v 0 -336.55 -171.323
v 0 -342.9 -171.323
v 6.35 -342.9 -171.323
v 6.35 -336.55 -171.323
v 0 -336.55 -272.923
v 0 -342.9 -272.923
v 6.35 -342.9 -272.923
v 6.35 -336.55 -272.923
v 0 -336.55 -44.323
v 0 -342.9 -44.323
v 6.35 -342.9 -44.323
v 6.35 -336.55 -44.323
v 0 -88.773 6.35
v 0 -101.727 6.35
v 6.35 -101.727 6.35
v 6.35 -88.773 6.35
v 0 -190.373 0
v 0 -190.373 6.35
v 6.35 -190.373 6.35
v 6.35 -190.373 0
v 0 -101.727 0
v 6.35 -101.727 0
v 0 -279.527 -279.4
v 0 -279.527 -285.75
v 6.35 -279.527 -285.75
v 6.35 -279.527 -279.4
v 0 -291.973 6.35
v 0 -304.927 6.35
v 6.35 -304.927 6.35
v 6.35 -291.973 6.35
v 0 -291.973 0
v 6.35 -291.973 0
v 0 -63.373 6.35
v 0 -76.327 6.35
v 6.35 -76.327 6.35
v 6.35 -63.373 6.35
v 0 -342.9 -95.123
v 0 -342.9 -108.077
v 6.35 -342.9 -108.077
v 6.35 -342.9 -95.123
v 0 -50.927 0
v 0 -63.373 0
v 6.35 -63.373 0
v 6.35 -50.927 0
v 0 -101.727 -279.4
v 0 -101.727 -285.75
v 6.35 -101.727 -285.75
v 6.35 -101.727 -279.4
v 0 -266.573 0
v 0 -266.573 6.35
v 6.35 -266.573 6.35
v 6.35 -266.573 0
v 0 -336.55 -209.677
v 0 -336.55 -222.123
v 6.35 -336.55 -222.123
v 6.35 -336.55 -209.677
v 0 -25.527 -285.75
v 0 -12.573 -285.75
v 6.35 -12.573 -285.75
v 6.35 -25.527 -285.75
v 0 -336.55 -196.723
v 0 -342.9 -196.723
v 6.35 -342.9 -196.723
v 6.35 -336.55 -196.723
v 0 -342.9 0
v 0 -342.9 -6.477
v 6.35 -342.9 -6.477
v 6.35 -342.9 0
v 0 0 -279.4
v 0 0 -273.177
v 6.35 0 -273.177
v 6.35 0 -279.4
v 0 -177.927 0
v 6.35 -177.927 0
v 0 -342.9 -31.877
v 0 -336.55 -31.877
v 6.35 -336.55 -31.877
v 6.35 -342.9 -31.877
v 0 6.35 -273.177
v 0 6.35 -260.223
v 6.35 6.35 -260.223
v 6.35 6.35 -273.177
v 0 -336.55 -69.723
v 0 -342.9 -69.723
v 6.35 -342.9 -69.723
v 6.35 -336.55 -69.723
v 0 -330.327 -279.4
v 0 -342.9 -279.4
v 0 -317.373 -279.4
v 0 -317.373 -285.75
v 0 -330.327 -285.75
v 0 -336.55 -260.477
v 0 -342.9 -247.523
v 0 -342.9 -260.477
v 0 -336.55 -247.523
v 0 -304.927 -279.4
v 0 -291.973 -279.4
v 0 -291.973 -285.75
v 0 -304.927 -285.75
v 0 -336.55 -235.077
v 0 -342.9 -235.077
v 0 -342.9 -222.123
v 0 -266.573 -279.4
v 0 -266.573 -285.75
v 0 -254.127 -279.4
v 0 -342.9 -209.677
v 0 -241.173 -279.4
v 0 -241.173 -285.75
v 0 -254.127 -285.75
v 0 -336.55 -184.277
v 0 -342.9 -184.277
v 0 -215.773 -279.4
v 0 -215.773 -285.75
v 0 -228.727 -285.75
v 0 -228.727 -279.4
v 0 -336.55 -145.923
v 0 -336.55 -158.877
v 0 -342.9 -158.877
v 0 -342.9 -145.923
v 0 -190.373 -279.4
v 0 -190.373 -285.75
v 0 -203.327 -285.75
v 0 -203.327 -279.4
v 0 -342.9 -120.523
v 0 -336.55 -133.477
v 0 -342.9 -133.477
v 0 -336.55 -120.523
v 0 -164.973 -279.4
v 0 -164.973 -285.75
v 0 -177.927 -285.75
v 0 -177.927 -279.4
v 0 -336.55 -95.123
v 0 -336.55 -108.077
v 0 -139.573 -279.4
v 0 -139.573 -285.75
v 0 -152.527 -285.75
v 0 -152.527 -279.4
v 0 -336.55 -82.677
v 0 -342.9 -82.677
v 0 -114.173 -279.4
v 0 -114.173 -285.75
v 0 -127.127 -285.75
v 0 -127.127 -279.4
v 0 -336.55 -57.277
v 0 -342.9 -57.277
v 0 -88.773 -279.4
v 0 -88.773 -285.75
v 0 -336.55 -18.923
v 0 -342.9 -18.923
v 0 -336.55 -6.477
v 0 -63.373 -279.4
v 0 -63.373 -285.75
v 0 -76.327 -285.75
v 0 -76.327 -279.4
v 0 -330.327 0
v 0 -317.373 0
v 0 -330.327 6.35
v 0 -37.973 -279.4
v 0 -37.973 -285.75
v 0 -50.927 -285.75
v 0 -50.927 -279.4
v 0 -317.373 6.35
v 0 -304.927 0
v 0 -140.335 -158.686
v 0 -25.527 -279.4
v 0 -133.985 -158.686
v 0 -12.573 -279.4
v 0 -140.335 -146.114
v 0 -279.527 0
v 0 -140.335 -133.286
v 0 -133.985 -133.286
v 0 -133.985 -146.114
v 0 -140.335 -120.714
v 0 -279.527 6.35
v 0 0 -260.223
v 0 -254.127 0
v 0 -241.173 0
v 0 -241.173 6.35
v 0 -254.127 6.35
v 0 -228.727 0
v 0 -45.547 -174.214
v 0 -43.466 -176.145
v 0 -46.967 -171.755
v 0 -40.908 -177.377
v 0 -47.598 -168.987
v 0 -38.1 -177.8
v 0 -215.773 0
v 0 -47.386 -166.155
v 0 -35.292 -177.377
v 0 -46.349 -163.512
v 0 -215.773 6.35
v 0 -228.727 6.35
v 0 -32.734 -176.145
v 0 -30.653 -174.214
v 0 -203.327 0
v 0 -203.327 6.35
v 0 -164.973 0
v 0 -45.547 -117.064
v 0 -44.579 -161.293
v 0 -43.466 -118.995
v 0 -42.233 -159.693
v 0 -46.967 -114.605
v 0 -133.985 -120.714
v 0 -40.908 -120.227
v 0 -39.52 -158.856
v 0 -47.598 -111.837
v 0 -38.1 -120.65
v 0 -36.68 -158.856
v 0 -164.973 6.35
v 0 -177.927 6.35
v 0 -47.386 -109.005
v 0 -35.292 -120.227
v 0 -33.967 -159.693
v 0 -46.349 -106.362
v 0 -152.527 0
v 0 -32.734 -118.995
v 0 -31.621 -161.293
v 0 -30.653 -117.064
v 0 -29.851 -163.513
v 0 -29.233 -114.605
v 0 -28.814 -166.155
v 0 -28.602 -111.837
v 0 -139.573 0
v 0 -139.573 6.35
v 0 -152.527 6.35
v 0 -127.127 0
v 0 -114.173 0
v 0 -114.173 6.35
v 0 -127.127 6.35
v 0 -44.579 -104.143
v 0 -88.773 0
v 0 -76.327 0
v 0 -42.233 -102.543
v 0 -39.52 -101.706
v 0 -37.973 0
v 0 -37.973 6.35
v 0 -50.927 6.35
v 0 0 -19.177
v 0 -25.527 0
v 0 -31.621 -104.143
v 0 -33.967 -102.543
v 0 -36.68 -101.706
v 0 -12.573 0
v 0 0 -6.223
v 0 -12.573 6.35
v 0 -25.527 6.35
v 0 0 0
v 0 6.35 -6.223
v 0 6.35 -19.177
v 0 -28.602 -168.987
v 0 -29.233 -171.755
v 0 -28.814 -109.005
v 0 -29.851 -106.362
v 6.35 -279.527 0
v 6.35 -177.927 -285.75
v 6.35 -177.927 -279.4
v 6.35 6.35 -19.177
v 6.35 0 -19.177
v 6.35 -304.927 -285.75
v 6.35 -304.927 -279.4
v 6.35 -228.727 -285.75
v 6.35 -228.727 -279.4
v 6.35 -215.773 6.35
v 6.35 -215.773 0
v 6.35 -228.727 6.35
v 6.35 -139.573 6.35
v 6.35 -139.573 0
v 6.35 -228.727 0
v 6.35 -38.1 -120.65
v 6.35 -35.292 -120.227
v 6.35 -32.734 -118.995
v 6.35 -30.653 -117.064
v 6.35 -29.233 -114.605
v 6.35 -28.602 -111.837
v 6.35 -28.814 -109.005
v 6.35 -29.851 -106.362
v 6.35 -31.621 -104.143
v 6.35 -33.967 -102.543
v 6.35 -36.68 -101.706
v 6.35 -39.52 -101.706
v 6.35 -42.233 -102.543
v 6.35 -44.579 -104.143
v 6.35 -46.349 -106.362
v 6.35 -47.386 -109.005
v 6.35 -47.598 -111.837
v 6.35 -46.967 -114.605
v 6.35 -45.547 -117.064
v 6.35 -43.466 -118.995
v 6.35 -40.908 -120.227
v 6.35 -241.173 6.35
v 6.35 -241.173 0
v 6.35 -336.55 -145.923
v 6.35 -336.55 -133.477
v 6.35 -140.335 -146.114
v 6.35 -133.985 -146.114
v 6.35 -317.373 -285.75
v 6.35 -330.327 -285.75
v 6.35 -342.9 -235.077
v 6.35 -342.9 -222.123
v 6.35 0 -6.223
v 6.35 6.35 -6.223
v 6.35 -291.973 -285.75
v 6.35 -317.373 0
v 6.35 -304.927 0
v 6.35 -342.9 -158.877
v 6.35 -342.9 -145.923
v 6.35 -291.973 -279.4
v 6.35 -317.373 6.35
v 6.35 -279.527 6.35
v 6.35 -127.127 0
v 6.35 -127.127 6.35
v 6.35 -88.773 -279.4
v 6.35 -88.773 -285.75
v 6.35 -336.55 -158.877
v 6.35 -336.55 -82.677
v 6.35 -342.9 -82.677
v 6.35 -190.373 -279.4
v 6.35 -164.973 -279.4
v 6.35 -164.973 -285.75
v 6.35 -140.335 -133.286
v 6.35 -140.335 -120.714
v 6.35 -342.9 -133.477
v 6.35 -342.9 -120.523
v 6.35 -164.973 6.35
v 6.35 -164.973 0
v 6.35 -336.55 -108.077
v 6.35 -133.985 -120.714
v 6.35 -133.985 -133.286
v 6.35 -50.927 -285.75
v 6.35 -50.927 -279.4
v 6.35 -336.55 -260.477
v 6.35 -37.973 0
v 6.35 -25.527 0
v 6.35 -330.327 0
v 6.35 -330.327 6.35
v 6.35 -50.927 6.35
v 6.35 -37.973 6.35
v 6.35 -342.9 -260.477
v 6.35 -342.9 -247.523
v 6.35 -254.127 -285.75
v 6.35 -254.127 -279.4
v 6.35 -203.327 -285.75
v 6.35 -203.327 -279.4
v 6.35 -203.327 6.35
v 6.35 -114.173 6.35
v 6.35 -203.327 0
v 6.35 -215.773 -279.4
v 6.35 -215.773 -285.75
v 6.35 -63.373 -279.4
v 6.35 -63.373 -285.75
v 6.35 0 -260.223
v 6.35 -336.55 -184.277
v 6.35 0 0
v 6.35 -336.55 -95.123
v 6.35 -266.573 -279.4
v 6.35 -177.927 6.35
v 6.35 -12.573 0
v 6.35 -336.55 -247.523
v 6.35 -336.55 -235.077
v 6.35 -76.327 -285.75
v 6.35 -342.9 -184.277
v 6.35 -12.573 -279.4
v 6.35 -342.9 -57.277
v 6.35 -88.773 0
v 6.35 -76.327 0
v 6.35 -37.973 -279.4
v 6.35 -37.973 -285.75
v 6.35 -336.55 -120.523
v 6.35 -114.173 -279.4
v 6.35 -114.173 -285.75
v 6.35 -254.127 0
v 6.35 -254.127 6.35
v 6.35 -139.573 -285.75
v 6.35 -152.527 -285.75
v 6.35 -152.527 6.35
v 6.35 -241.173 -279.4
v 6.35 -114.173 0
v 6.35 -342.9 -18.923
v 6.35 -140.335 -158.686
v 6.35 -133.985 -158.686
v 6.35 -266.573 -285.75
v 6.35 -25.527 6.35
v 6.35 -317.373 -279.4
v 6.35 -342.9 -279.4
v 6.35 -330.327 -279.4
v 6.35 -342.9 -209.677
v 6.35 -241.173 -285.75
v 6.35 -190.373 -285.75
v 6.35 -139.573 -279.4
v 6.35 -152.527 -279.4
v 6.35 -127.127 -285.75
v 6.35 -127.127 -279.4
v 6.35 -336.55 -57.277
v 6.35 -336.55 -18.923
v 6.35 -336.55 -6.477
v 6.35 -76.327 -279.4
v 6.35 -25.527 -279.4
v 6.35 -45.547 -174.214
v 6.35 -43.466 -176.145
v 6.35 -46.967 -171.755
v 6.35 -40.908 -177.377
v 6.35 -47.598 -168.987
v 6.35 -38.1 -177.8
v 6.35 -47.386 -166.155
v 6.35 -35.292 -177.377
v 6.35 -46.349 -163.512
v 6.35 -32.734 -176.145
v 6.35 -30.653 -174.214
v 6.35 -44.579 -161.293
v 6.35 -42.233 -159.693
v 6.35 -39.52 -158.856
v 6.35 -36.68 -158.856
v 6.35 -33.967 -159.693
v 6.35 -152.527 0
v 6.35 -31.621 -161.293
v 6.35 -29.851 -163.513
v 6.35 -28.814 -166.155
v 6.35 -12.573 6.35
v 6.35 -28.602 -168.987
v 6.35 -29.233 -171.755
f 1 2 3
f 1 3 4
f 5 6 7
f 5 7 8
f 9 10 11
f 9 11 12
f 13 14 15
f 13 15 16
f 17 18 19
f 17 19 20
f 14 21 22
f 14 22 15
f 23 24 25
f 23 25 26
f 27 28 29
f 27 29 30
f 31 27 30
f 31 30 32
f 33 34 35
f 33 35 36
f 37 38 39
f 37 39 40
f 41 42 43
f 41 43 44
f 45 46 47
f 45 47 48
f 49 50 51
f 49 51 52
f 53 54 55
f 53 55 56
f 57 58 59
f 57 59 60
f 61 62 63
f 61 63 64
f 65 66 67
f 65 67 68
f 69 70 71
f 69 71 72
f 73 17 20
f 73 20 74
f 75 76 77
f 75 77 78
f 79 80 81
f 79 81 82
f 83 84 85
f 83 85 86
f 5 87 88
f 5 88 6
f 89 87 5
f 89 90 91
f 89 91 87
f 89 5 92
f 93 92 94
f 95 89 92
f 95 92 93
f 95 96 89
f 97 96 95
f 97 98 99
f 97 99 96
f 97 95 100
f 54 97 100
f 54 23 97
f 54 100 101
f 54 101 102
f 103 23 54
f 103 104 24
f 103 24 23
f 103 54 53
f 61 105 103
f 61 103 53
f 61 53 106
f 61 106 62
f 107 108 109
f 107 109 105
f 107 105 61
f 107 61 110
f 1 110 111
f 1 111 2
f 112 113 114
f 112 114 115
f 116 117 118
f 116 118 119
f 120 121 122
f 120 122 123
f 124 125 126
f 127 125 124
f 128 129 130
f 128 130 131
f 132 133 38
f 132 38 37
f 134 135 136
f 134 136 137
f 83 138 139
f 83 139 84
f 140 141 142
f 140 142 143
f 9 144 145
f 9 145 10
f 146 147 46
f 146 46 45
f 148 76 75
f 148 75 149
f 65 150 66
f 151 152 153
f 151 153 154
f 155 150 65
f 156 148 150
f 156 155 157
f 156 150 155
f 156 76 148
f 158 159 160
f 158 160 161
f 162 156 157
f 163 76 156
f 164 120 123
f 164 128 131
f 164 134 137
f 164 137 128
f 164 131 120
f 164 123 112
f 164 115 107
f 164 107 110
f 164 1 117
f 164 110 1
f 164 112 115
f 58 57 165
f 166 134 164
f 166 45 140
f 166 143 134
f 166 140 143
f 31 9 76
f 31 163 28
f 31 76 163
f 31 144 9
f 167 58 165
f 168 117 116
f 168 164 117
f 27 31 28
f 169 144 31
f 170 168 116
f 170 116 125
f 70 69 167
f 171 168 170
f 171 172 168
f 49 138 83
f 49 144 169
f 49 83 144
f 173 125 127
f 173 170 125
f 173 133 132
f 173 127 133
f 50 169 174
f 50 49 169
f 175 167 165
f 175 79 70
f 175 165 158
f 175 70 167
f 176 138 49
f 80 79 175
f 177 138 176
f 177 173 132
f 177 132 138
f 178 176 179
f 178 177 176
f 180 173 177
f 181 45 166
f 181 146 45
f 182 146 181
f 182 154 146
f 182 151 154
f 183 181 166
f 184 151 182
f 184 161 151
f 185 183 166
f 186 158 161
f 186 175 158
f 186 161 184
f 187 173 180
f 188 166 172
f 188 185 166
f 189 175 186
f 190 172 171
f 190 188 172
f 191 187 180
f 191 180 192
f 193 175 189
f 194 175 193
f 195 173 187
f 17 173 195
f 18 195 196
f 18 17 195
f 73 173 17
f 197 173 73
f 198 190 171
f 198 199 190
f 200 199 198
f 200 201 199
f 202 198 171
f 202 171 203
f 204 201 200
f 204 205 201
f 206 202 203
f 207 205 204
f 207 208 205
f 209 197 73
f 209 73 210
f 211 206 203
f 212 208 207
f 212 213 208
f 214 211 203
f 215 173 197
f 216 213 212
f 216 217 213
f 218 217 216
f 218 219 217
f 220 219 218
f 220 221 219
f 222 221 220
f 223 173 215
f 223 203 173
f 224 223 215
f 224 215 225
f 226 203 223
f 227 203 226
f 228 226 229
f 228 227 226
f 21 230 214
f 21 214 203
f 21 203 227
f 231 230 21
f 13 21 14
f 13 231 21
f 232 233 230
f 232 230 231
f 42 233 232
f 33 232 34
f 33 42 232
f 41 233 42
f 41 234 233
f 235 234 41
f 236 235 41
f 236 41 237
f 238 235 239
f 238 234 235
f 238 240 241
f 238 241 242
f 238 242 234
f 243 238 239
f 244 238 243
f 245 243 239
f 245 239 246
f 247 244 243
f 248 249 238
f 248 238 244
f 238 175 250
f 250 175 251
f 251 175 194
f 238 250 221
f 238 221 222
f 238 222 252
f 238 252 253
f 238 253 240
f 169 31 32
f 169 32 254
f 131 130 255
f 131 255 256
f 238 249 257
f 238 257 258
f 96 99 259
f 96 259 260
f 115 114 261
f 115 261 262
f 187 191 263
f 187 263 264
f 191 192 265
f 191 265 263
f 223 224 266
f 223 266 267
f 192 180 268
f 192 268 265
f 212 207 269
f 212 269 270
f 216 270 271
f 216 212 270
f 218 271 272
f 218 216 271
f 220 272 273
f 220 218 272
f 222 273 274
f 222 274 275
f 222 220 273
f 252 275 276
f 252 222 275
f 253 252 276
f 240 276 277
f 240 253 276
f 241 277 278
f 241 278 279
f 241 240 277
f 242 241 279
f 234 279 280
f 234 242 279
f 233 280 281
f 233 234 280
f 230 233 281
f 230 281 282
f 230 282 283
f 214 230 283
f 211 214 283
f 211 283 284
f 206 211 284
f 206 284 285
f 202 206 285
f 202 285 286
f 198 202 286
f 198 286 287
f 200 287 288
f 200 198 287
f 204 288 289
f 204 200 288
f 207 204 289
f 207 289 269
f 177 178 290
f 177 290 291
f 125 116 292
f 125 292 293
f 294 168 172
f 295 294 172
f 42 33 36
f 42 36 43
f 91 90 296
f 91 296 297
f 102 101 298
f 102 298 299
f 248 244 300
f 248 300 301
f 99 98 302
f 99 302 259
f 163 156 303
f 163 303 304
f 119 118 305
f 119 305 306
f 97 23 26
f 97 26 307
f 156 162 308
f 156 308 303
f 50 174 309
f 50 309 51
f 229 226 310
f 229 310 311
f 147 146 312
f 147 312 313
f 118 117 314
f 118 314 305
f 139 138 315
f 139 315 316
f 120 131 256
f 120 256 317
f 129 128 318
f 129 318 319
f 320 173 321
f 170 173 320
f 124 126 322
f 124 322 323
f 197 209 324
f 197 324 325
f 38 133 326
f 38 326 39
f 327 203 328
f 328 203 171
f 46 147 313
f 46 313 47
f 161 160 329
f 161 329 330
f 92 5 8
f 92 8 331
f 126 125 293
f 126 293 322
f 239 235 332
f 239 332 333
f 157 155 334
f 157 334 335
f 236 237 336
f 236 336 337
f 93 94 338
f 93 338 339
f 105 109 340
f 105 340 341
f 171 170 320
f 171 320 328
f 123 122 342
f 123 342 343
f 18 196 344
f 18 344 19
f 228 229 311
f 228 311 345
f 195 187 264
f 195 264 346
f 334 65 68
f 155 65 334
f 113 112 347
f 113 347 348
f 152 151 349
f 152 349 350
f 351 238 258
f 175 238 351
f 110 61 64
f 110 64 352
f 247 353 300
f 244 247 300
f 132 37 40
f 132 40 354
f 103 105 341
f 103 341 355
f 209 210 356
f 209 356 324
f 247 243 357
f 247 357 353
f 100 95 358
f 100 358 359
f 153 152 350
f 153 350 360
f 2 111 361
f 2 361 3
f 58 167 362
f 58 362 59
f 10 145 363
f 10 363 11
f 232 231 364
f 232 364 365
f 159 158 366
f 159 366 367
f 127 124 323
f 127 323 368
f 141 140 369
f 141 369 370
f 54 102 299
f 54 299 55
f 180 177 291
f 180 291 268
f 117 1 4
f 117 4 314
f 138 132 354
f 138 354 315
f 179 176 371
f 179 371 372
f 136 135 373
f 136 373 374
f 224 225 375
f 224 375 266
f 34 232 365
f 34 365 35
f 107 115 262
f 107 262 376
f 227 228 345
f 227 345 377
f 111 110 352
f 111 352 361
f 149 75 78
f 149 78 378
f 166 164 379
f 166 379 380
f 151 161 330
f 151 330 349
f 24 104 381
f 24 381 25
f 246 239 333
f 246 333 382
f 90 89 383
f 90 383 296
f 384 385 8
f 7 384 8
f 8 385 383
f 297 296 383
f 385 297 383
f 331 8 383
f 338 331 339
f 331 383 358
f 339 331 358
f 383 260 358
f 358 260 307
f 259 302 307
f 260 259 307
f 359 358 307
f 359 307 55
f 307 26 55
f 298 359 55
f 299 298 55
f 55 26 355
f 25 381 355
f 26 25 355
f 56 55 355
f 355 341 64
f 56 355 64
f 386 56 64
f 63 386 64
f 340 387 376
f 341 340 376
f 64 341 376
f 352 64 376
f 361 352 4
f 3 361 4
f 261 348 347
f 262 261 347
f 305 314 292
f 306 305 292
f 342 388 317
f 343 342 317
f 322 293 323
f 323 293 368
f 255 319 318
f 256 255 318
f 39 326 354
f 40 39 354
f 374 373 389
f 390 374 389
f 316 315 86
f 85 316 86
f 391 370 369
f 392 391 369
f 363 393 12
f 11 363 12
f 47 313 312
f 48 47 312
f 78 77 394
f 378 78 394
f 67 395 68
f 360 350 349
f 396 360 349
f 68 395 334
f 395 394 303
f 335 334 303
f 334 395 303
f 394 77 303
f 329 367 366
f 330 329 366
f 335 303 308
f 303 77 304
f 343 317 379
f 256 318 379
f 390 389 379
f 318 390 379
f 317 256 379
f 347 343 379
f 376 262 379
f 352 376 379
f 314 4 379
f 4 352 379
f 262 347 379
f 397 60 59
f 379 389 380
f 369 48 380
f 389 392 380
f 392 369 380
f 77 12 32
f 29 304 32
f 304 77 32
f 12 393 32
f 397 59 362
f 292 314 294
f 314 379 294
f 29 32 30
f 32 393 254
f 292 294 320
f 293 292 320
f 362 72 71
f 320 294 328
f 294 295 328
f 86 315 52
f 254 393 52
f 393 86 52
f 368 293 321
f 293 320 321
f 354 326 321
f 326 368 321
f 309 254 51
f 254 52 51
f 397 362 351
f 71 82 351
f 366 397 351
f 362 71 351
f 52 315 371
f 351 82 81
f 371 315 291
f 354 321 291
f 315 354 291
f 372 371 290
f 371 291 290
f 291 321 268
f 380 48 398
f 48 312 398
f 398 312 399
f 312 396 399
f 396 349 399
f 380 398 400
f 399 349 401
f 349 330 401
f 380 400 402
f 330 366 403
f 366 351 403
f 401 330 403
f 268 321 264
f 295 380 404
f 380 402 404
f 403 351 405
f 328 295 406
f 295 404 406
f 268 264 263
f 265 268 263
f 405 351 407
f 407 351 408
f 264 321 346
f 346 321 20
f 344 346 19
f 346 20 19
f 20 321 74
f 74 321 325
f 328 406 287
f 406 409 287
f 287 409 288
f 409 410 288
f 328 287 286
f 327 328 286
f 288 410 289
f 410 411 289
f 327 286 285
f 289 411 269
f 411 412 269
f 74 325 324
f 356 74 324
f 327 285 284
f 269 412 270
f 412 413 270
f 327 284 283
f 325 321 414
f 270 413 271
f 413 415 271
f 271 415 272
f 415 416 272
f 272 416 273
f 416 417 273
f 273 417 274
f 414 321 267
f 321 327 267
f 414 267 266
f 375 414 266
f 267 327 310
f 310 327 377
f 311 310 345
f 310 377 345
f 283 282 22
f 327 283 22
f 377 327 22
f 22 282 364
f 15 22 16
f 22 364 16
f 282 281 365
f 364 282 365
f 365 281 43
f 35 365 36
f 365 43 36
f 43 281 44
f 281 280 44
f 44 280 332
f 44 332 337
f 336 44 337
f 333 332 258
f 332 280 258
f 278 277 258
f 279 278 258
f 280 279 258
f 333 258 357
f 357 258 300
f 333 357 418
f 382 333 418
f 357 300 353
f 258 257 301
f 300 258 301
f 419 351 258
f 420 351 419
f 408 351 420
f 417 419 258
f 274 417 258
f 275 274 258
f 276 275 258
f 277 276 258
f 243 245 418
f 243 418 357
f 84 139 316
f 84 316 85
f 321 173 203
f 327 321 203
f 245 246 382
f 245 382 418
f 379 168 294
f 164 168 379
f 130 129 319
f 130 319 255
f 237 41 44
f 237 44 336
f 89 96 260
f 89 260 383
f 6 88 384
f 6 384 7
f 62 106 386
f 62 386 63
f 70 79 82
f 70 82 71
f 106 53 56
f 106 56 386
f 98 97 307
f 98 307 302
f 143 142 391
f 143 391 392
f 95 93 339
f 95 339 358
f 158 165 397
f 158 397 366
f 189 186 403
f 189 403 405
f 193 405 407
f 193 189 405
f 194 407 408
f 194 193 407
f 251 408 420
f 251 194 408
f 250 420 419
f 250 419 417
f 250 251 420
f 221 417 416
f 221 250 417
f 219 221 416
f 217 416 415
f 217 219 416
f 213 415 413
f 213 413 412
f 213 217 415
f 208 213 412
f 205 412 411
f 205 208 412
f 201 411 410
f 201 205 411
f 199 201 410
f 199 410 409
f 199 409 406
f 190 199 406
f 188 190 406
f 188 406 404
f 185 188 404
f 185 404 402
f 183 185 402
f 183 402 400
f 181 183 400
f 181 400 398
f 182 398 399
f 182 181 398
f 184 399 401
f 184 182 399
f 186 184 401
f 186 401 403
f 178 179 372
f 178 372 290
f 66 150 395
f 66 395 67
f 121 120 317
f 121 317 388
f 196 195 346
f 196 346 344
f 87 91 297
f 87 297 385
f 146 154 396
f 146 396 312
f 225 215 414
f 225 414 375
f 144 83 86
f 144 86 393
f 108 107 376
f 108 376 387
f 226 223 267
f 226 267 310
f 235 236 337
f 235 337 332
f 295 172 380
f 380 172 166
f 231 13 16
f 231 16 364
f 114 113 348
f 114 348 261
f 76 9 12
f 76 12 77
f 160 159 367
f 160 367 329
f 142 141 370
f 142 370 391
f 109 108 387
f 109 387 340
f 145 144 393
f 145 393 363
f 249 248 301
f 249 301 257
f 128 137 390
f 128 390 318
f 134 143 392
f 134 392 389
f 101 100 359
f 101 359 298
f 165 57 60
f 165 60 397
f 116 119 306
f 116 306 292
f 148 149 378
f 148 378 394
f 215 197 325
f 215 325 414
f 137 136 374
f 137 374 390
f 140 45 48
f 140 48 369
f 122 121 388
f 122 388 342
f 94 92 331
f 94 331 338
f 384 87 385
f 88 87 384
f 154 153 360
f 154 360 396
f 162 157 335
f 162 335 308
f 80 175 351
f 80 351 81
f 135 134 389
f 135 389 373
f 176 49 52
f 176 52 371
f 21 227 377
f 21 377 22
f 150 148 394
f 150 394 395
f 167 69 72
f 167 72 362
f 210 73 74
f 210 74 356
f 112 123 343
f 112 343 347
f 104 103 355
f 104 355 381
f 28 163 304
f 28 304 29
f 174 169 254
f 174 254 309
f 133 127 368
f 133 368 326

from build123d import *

# Parameters (mm, degrees)
SKETCH1_R           = 9.525
SKETCH1_W           = 12.573
SKETCH1_H           = 6.35
BOSS_EXTRUDE1_DEPTH = 6.35


with BuildPart() as part:
    # Sketch1 → Boss-Extrude1 (new body)
    with BuildSketch(Plane(origin=(0, 0, 0), x_dir=(0, 0, -1), z_dir=(1, 0, 0))):
        Polygon((0, 0), (6.223, 0), (6.223, 6.35), (19.177, 6.35), (19.177, 0), (260.223, 0), (260.223, 6.35), (273.177, 6.35), (273.177, 0), (279.4, 0), (279.4, -12.573), (285.75, -12.573), (285.75, -25.527), (279.4, -25.527), (279.4, -37.973), (285.75, -37.973), (285.75, -50.927), (279.4, -50.927), (279.4, -63.373), (285.75, -63.373), (285.75, -76.327), (279.4, -76.327), (279.4, -88.773), (285.75, -88.773), (285.75, -101.727), (279.4, -101.727), (279.4, -114.173), (285.75, -114.173), (285.75, -127.127), (279.4, -127.127), (279.4, -139.573), (285.75, -139.573), (285.75, -152.527), (279.4, -152.527), (279.4, -164.973), (285.75, -164.973), (285.75, -177.927), (279.4, -177.927), (279.4, -190.373), (285.75, -190.373), (285.75, -203.327), (279.4, -203.327), (279.4, -215.773), (285.75, -215.773), (285.75, -228.727), (279.4, -228.727), (279.4, -241.173), (285.75, -241.173), (285.75, -254.127), (279.4, -254.127), (279.4, -266.573), (285.75, -266.573), (285.75, -279.527), (279.4, -279.527), (279.4, -291.973), (285.75, -291.973), (285.75, -304.927), (279.4, -304.927), (279.4, -317.373), (285.75, -317.373), (285.75, -330.327), (279.4, -330.327), (279.4, -342.9), (272.923, -342.9), (272.923, -336.55), (260.477, -336.55), (260.477, -342.9), (247.523, -342.9), (247.523, -336.55), (235.077, -336.55), (235.077, -342.9), (222.123, -342.9), (222.123, -336.55), (209.677, -336.55), (209.677, -342.9), (196.723, -342.9), (196.723, -336.55), (184.277, -336.55), (184.277, -342.9), (171.323, -342.9), (171.323, -336.55), (158.877, -336.55), (158.877, -342.9), (145.923, -342.9), (145.923, -336.55), (133.477, -336.55), (133.477, -342.9), (120.523, -342.9), (120.523, -336.55), (108.077, -336.55), (108.077, -342.9), (95.123, -342.9), (95.123, -336.55), (82.677, -336.55), (82.677, -342.9), (69.723, -342.9), (69.723, -336.55), (57.277, -336.55), (57.277, -342.9), (44.323, -342.9), (44.323, -336.55), (31.877, -336.55), (31.877, -342.9), (18.923, -342.9), (18.923, -336.55), (6.477, -336.55), (6.477, -342.9), (0, -342.9), (0, -330.327), (-6.35, -330.327), (-6.35, -317.373), (0, -317.373), (0, -304.927), (-6.35, -304.927), (-6.35, -291.973), (0, -291.973), (0, -279.527), (-6.35, -279.527), (-6.35, -266.573), (0, -266.573), (0, -254.127), (-6.35, -254.127), (-6.35, -241.173), (0, -241.173), (0, -228.727), (-6.35, -228.727), (-6.35, -215.773), (0, -215.773), (0, -203.327), (-6.35, -203.327), (-6.35, -190.373), (0, -190.373), (0, -177.927), (-6.35, -177.927), (-6.35, -164.973), (0, -164.973), (0, -152.527), (-6.35, -152.527), (-6.35, -139.573), (0, -139.573), (0, -127.127), (-6.35, -127.127), (-6.35, -114.173), (0, -114.173), (0, -101.727), (-6.35, -101.727), (-6.35, -88.773), (0, -88.773), (0, -76.327), (-6.35, -76.327), (-6.35, -63.373), (0, -63.373), (0, -50.927), (-6.35, -50.927), (-6.35, -37.973), (0, -37.973), (0, -25.527), (-6.35, -25.527), (-6.35, -12.573), (0, -12.573), align=None)
        with Locations((111.125, -38.1)):
            Circle(SKETCH1_R, mode=Mode.SUBTRACT)
        with Locations((168.275, -38.1)):
            Circle(SKETCH1_R, mode=Mode.SUBTRACT)
        with Locations((127, -137.16)):
            Rectangle(SKETCH1_W, SKETCH1_H, mode=Mode.SUBTRACT)
        with Locations((152.4, -137.16)):
            Rectangle(SKETCH1_W, SKETCH1_H, mode=Mode.SUBTRACT)
    extrude(amount=BOSS_EXTRUDE1_DEPTH)


solid = part.part
